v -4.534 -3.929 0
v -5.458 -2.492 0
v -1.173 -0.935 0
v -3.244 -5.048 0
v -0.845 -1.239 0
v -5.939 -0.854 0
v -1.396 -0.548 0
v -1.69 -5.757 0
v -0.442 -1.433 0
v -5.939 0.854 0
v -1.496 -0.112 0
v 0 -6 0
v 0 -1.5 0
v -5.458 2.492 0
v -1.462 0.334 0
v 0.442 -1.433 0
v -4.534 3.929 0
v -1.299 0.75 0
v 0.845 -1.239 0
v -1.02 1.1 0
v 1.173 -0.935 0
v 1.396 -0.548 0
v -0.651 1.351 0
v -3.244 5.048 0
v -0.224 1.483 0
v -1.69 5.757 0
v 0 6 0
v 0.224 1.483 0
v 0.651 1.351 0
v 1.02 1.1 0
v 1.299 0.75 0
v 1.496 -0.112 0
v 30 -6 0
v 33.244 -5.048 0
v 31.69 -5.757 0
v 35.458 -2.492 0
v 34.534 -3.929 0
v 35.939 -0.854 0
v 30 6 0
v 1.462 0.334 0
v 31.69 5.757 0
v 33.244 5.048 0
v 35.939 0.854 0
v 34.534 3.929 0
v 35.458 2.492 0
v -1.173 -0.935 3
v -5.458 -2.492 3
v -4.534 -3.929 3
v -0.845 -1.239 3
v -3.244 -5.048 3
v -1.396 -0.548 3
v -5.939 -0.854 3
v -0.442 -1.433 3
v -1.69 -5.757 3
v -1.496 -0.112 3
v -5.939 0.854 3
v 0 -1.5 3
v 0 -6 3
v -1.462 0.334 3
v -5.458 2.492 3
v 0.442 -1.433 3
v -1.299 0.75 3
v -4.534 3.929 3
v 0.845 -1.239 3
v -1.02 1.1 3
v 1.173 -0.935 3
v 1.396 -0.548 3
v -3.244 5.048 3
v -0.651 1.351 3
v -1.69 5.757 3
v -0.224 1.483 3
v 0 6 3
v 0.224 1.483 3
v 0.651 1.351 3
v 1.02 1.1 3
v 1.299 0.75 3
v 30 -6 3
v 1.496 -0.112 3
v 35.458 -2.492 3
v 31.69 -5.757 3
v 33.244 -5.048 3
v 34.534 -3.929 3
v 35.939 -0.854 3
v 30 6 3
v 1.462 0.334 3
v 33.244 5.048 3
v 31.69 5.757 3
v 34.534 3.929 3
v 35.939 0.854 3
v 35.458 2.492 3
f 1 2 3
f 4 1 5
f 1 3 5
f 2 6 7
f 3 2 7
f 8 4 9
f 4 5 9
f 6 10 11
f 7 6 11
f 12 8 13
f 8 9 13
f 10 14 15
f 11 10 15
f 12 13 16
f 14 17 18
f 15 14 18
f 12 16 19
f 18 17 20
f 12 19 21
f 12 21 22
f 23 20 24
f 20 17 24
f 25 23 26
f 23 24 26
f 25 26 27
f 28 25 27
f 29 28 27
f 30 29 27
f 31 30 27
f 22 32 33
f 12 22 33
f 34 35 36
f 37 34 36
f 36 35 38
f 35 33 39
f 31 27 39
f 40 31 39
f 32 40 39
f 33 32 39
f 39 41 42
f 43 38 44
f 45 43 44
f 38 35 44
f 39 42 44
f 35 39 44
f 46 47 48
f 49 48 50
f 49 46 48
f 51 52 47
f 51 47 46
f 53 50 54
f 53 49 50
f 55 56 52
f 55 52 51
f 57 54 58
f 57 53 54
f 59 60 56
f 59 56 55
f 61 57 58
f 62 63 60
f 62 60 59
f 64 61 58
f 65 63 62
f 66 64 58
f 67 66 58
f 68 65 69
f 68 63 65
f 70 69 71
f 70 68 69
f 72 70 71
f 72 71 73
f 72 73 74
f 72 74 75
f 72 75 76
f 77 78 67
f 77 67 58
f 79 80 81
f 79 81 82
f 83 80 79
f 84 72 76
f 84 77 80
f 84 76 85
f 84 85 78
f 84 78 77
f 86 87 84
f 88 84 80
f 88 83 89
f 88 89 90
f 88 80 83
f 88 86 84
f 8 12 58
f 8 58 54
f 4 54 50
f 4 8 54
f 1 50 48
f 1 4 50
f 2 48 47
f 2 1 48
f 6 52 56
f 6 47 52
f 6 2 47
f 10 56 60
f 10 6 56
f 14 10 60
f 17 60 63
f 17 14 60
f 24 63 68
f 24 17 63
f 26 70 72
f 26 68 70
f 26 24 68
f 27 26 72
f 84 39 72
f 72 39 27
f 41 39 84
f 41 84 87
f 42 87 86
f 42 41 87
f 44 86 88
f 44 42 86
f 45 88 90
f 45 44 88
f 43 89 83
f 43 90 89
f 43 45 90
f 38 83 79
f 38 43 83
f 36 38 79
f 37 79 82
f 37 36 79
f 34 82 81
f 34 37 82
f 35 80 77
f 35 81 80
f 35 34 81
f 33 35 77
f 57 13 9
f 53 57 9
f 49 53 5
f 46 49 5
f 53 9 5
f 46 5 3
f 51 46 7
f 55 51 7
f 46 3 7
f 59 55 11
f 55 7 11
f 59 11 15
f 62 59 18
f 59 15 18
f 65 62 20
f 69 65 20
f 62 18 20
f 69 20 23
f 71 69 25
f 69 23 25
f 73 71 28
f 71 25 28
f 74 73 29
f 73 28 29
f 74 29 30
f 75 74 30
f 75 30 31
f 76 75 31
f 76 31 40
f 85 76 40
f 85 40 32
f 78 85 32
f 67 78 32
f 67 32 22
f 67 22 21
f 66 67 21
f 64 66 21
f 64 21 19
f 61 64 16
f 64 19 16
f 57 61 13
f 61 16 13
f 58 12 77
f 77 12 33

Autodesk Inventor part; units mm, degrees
ref_plane "YZ Plane" through (0, 0, 0) normal (1, 0, 0) x (0, 1, 0)
ref_plane "XZ Plane" through (0, 0, 0) normal (0, 1, 0) x (-1, 0, 0)
ref_plane "XY Plane" through (0, 0, 0) normal (0, 0, 1) x (1, 0, 0)
sketch "Sketch1" plane through (0, 0, 0) normal (0, 0, 1) x (1, 0, 0)
  line L0 (0, 0) -> (30, 0) construction
  line L1 (0, -6) -> (30, -6)
  line L2 (30, 6) -> (0, 6)
  arc A0 (0, 6) -> (0, -6) centre (0, 0) ccw
  arc A1 (30, -6) -> (30, 6) centre (30, 0) ccw
  point P0 (15, 0)
  dimension "d0" = 12
  dimension "d1" = 30
extrude "Extrusion1" add sketch "Sketch1" along normal blind 3
sketch "Sketch2" plane through (0, 0, 3) normal (0, 0, 1) x (1, 0, 0)
  point P0 (0, 0)
  point P1 (0, 0)
hole "Hole1" at (0, 0, 3) direction (0, 0, -1) diameter 3 end through all
properties part number "Pancake_Reverse Weight" material "Aluminum 6061"
